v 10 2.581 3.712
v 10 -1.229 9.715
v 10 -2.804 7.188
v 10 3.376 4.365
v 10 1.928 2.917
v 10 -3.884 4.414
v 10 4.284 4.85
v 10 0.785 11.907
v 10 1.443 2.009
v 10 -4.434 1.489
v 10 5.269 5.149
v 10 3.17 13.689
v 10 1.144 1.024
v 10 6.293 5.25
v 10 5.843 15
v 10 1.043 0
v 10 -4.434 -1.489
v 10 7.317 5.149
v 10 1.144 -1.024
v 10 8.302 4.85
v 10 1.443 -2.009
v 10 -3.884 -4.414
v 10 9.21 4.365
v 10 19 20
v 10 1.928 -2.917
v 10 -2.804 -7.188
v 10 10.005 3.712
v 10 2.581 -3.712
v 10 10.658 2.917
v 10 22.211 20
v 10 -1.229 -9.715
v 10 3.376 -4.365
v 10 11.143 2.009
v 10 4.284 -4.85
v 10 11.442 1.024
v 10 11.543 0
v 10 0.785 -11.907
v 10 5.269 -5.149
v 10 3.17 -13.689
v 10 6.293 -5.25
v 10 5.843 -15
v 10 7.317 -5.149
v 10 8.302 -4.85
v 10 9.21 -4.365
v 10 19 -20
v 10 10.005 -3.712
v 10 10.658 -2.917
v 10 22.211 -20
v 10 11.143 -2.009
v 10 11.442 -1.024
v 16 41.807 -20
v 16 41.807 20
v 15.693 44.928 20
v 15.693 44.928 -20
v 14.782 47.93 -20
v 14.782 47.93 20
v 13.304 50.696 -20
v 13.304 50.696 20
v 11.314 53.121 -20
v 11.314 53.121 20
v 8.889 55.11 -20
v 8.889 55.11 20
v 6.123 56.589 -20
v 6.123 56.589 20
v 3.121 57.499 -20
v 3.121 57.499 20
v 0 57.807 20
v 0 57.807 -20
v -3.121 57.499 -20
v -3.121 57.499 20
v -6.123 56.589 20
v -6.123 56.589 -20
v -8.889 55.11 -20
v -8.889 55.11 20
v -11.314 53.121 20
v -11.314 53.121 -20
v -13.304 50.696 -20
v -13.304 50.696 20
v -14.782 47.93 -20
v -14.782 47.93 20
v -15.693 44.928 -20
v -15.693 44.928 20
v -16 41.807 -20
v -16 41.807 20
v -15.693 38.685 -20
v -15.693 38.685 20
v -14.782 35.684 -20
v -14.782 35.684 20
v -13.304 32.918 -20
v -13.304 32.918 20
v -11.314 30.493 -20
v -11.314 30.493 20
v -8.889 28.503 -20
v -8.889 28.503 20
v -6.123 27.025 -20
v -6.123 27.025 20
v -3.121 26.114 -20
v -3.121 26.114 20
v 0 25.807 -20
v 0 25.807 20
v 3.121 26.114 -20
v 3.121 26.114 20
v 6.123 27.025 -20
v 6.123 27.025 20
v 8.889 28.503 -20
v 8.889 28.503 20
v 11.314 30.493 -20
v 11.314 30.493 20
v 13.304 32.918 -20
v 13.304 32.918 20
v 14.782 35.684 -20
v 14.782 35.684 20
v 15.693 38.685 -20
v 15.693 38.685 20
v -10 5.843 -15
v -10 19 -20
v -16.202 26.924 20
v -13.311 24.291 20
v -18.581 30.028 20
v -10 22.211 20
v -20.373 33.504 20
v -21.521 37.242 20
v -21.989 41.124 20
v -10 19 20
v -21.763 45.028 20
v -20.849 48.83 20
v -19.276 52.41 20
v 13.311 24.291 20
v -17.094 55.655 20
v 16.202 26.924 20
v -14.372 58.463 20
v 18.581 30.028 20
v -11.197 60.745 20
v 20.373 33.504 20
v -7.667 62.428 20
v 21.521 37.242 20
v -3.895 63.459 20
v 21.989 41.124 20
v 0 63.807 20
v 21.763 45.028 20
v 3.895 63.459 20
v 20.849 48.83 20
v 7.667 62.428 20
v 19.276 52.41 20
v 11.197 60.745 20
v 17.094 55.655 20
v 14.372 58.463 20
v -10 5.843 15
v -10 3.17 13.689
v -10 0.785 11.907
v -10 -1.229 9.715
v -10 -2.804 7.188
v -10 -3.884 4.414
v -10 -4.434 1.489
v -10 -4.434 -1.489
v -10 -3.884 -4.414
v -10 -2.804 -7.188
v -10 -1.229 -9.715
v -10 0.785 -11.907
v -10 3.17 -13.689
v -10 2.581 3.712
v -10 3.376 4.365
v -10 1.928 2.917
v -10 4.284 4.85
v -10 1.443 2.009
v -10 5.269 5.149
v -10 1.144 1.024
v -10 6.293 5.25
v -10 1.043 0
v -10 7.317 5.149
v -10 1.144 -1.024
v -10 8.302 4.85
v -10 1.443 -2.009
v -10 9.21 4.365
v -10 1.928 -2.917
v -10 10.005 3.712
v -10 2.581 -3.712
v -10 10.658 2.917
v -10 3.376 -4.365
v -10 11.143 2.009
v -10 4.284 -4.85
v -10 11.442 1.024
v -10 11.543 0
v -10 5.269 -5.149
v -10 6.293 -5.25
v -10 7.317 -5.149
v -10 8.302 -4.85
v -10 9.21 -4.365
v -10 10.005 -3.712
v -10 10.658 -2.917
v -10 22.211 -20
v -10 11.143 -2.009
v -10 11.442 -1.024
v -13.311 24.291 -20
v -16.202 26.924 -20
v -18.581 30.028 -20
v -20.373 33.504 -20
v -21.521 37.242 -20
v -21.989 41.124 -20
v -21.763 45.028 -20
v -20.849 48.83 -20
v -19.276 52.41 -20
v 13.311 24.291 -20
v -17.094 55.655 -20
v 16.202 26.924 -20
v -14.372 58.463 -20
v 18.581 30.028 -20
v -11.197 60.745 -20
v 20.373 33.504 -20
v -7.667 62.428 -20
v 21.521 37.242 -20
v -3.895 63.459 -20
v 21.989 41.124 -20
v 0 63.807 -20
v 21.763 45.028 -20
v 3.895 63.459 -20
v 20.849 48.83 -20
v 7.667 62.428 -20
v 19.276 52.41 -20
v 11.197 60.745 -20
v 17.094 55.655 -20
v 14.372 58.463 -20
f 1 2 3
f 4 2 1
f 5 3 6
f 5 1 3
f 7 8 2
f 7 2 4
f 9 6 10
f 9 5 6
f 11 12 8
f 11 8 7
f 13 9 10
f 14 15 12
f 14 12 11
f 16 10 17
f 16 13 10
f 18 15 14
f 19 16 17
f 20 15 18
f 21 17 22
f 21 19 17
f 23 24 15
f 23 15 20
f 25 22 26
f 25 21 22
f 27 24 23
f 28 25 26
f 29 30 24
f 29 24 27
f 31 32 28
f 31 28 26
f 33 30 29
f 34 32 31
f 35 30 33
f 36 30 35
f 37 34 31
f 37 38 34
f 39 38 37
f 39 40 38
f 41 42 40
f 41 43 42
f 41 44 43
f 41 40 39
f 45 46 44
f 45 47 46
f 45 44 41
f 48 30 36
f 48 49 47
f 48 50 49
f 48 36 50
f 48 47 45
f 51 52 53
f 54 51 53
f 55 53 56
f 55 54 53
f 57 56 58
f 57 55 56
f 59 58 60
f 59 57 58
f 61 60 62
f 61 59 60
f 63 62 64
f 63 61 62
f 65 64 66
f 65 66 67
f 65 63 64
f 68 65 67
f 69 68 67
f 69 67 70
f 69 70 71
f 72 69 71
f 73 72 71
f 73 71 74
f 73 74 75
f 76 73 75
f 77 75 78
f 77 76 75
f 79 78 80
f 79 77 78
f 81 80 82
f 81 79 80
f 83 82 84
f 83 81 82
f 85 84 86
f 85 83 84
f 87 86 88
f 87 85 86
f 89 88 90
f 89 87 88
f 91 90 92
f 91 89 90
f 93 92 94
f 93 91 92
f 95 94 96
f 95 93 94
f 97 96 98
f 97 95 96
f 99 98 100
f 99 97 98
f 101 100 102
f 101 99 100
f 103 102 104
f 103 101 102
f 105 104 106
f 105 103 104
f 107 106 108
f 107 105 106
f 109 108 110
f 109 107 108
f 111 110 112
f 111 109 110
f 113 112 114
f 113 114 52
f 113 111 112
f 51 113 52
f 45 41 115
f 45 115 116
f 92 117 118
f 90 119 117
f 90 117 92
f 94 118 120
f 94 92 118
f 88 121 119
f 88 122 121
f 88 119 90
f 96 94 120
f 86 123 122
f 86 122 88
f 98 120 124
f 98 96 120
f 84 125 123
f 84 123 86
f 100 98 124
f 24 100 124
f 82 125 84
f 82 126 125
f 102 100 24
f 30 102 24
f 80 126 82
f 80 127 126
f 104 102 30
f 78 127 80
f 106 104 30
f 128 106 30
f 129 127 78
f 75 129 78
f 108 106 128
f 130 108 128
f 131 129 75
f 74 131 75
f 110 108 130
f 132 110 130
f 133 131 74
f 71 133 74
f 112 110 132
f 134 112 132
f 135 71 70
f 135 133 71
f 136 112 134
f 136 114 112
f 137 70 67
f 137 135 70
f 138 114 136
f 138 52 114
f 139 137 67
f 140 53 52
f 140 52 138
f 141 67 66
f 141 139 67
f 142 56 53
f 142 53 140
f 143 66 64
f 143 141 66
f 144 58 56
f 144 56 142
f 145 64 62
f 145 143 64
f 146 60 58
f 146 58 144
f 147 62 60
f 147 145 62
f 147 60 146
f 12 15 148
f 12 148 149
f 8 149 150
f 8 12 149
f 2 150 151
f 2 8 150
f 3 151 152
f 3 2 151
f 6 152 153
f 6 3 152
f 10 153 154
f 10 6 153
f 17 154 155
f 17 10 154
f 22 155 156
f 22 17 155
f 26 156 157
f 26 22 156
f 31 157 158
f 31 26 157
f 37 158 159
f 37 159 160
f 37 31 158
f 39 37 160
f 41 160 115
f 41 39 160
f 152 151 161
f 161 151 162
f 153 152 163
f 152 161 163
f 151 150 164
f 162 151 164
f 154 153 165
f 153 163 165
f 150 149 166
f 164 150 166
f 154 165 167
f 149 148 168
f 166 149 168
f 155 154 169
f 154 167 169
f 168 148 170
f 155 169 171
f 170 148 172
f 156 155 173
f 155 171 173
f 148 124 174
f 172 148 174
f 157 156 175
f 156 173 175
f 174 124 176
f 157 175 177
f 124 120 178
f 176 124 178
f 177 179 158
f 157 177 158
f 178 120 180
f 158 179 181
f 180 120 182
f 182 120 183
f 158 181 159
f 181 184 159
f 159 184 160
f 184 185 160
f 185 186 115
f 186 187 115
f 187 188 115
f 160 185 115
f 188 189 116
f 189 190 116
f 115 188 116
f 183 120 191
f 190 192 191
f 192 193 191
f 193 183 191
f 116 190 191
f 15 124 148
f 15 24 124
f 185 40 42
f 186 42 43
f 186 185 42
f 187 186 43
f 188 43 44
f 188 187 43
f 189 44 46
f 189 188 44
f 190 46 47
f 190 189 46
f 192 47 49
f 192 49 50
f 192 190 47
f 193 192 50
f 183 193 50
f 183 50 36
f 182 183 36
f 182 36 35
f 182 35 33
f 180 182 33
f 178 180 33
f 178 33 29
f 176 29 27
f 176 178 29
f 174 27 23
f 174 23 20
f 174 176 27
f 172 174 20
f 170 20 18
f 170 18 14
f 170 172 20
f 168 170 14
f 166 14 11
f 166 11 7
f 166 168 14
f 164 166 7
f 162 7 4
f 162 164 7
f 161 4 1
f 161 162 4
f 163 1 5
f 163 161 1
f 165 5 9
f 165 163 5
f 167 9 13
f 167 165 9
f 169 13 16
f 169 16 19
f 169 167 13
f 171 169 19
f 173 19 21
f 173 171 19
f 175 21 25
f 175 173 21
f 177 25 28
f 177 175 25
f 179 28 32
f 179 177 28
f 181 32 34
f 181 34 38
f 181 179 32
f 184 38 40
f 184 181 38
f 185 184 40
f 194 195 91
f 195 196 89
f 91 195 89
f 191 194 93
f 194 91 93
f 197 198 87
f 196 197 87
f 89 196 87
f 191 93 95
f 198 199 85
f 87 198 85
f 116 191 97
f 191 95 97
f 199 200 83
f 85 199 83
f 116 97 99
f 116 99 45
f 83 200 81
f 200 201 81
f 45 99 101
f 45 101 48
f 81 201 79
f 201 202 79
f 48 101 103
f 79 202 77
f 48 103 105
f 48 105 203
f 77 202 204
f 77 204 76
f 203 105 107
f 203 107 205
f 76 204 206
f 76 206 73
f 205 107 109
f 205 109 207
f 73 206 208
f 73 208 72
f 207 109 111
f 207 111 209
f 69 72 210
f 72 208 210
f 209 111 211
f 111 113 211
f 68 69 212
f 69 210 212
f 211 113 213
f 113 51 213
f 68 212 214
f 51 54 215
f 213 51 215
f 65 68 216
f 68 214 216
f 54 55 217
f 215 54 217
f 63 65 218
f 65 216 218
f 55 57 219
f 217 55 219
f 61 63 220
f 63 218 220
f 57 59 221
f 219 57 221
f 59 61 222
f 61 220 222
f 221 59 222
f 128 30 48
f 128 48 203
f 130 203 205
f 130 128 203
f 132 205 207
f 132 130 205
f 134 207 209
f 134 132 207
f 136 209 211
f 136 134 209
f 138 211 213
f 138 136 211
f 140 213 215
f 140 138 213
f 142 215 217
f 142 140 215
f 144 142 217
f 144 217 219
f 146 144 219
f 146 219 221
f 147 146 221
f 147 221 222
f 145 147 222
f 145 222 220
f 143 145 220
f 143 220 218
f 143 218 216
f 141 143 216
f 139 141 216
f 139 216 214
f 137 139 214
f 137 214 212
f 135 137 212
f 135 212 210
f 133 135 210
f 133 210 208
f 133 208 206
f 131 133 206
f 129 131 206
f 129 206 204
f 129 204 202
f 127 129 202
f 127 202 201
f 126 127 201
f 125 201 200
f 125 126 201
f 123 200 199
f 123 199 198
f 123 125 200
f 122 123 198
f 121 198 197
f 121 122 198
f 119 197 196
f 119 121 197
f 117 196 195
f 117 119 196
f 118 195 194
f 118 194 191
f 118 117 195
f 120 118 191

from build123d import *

# Parameters (mm, degrees)
SKETCH1_R                = 22
SKETCH1_R_2              = 16
BOSS_EXTRUDE1_DEPTH      = 20
BOSS_EXTRUDE2_REACH      = 55.774
BOSS_EXTRUDE2_END_RADIUS = 22
SKETCH5_W                = 20
SKETCH5_H                = 40
SKETCH6_R                = 5.25
BOSS_EXTRUDE3_DEPTH      = 10


with BuildPart() as part:
    # Sketch1 → Boss-Extrude1 (new, symmetric)
    with BuildSketch(Plane.XY):
        with Locations((0, 41.80685414)):
            Circle(SKETCH1_R)
        with Locations((0, 41.80685414)):
            Circle(SKETCH1_R_2, mode=Mode.SUBTRACT)
    extrude(amount=BOSS_EXTRUDE1_DEPTH, both=True)

    # Boss-Extrude2: up to this cylinder (the profile starts outside it)
    boss_extrude2_end = Plane(origin=(0, 41.80685414, 0), z_dir=(0, 0, -1)) * Cylinder(BOSS_EXTRUDE2_END_RADIUS, 156.548, mode=Mode.PRIVATE)
    # Sketch5 → Boss-Extrude2 (add, up to the surface)
    with BuildSketch(Plane(origin=(0, 19, 0), x_dir=(1, 0, 0), z_dir=(0, 1, 0)), mode=Mode.PRIVATE) as boss_extrude2_sk1:
        Rectangle(SKETCH5_W, SKETCH5_H)
    boss_extrude2_tool1 = extrude(boss_extrude2_sk1.sketch, amount=BOSS_EXTRUDE2_REACH, mode=Mode.PRIVATE) - boss_extrude2_end
    add(boss_extrude2_tool1.solids().sort_by_distance((0, 19, 0))[0])

    # Sketch6 → Boss-Extrude3 (add, symmetric)
    with BuildSketch(Plane(origin=(0, 0, 0), x_dir=(0, 0, -1), z_dir=(1, 0, 0))):
        with BuildLine():
            Line((-20, 19), (-15, 5.842729547))
            ThreePointArc((-15, 5.842729547), (0, -4.503591016), (15, 5.842729547))
            Line((15, 5.842729547), (20, 19))
            Line((20, 19), (-20, 19))
        make_face()
        with Locations((0, 6.293)):
            Circle(SKETCH6_R, mode=Mode.SUBTRACT)
    extrude(amount=BOSS_EXTRUDE3_DEPTH, both=True)


solid = part.part
